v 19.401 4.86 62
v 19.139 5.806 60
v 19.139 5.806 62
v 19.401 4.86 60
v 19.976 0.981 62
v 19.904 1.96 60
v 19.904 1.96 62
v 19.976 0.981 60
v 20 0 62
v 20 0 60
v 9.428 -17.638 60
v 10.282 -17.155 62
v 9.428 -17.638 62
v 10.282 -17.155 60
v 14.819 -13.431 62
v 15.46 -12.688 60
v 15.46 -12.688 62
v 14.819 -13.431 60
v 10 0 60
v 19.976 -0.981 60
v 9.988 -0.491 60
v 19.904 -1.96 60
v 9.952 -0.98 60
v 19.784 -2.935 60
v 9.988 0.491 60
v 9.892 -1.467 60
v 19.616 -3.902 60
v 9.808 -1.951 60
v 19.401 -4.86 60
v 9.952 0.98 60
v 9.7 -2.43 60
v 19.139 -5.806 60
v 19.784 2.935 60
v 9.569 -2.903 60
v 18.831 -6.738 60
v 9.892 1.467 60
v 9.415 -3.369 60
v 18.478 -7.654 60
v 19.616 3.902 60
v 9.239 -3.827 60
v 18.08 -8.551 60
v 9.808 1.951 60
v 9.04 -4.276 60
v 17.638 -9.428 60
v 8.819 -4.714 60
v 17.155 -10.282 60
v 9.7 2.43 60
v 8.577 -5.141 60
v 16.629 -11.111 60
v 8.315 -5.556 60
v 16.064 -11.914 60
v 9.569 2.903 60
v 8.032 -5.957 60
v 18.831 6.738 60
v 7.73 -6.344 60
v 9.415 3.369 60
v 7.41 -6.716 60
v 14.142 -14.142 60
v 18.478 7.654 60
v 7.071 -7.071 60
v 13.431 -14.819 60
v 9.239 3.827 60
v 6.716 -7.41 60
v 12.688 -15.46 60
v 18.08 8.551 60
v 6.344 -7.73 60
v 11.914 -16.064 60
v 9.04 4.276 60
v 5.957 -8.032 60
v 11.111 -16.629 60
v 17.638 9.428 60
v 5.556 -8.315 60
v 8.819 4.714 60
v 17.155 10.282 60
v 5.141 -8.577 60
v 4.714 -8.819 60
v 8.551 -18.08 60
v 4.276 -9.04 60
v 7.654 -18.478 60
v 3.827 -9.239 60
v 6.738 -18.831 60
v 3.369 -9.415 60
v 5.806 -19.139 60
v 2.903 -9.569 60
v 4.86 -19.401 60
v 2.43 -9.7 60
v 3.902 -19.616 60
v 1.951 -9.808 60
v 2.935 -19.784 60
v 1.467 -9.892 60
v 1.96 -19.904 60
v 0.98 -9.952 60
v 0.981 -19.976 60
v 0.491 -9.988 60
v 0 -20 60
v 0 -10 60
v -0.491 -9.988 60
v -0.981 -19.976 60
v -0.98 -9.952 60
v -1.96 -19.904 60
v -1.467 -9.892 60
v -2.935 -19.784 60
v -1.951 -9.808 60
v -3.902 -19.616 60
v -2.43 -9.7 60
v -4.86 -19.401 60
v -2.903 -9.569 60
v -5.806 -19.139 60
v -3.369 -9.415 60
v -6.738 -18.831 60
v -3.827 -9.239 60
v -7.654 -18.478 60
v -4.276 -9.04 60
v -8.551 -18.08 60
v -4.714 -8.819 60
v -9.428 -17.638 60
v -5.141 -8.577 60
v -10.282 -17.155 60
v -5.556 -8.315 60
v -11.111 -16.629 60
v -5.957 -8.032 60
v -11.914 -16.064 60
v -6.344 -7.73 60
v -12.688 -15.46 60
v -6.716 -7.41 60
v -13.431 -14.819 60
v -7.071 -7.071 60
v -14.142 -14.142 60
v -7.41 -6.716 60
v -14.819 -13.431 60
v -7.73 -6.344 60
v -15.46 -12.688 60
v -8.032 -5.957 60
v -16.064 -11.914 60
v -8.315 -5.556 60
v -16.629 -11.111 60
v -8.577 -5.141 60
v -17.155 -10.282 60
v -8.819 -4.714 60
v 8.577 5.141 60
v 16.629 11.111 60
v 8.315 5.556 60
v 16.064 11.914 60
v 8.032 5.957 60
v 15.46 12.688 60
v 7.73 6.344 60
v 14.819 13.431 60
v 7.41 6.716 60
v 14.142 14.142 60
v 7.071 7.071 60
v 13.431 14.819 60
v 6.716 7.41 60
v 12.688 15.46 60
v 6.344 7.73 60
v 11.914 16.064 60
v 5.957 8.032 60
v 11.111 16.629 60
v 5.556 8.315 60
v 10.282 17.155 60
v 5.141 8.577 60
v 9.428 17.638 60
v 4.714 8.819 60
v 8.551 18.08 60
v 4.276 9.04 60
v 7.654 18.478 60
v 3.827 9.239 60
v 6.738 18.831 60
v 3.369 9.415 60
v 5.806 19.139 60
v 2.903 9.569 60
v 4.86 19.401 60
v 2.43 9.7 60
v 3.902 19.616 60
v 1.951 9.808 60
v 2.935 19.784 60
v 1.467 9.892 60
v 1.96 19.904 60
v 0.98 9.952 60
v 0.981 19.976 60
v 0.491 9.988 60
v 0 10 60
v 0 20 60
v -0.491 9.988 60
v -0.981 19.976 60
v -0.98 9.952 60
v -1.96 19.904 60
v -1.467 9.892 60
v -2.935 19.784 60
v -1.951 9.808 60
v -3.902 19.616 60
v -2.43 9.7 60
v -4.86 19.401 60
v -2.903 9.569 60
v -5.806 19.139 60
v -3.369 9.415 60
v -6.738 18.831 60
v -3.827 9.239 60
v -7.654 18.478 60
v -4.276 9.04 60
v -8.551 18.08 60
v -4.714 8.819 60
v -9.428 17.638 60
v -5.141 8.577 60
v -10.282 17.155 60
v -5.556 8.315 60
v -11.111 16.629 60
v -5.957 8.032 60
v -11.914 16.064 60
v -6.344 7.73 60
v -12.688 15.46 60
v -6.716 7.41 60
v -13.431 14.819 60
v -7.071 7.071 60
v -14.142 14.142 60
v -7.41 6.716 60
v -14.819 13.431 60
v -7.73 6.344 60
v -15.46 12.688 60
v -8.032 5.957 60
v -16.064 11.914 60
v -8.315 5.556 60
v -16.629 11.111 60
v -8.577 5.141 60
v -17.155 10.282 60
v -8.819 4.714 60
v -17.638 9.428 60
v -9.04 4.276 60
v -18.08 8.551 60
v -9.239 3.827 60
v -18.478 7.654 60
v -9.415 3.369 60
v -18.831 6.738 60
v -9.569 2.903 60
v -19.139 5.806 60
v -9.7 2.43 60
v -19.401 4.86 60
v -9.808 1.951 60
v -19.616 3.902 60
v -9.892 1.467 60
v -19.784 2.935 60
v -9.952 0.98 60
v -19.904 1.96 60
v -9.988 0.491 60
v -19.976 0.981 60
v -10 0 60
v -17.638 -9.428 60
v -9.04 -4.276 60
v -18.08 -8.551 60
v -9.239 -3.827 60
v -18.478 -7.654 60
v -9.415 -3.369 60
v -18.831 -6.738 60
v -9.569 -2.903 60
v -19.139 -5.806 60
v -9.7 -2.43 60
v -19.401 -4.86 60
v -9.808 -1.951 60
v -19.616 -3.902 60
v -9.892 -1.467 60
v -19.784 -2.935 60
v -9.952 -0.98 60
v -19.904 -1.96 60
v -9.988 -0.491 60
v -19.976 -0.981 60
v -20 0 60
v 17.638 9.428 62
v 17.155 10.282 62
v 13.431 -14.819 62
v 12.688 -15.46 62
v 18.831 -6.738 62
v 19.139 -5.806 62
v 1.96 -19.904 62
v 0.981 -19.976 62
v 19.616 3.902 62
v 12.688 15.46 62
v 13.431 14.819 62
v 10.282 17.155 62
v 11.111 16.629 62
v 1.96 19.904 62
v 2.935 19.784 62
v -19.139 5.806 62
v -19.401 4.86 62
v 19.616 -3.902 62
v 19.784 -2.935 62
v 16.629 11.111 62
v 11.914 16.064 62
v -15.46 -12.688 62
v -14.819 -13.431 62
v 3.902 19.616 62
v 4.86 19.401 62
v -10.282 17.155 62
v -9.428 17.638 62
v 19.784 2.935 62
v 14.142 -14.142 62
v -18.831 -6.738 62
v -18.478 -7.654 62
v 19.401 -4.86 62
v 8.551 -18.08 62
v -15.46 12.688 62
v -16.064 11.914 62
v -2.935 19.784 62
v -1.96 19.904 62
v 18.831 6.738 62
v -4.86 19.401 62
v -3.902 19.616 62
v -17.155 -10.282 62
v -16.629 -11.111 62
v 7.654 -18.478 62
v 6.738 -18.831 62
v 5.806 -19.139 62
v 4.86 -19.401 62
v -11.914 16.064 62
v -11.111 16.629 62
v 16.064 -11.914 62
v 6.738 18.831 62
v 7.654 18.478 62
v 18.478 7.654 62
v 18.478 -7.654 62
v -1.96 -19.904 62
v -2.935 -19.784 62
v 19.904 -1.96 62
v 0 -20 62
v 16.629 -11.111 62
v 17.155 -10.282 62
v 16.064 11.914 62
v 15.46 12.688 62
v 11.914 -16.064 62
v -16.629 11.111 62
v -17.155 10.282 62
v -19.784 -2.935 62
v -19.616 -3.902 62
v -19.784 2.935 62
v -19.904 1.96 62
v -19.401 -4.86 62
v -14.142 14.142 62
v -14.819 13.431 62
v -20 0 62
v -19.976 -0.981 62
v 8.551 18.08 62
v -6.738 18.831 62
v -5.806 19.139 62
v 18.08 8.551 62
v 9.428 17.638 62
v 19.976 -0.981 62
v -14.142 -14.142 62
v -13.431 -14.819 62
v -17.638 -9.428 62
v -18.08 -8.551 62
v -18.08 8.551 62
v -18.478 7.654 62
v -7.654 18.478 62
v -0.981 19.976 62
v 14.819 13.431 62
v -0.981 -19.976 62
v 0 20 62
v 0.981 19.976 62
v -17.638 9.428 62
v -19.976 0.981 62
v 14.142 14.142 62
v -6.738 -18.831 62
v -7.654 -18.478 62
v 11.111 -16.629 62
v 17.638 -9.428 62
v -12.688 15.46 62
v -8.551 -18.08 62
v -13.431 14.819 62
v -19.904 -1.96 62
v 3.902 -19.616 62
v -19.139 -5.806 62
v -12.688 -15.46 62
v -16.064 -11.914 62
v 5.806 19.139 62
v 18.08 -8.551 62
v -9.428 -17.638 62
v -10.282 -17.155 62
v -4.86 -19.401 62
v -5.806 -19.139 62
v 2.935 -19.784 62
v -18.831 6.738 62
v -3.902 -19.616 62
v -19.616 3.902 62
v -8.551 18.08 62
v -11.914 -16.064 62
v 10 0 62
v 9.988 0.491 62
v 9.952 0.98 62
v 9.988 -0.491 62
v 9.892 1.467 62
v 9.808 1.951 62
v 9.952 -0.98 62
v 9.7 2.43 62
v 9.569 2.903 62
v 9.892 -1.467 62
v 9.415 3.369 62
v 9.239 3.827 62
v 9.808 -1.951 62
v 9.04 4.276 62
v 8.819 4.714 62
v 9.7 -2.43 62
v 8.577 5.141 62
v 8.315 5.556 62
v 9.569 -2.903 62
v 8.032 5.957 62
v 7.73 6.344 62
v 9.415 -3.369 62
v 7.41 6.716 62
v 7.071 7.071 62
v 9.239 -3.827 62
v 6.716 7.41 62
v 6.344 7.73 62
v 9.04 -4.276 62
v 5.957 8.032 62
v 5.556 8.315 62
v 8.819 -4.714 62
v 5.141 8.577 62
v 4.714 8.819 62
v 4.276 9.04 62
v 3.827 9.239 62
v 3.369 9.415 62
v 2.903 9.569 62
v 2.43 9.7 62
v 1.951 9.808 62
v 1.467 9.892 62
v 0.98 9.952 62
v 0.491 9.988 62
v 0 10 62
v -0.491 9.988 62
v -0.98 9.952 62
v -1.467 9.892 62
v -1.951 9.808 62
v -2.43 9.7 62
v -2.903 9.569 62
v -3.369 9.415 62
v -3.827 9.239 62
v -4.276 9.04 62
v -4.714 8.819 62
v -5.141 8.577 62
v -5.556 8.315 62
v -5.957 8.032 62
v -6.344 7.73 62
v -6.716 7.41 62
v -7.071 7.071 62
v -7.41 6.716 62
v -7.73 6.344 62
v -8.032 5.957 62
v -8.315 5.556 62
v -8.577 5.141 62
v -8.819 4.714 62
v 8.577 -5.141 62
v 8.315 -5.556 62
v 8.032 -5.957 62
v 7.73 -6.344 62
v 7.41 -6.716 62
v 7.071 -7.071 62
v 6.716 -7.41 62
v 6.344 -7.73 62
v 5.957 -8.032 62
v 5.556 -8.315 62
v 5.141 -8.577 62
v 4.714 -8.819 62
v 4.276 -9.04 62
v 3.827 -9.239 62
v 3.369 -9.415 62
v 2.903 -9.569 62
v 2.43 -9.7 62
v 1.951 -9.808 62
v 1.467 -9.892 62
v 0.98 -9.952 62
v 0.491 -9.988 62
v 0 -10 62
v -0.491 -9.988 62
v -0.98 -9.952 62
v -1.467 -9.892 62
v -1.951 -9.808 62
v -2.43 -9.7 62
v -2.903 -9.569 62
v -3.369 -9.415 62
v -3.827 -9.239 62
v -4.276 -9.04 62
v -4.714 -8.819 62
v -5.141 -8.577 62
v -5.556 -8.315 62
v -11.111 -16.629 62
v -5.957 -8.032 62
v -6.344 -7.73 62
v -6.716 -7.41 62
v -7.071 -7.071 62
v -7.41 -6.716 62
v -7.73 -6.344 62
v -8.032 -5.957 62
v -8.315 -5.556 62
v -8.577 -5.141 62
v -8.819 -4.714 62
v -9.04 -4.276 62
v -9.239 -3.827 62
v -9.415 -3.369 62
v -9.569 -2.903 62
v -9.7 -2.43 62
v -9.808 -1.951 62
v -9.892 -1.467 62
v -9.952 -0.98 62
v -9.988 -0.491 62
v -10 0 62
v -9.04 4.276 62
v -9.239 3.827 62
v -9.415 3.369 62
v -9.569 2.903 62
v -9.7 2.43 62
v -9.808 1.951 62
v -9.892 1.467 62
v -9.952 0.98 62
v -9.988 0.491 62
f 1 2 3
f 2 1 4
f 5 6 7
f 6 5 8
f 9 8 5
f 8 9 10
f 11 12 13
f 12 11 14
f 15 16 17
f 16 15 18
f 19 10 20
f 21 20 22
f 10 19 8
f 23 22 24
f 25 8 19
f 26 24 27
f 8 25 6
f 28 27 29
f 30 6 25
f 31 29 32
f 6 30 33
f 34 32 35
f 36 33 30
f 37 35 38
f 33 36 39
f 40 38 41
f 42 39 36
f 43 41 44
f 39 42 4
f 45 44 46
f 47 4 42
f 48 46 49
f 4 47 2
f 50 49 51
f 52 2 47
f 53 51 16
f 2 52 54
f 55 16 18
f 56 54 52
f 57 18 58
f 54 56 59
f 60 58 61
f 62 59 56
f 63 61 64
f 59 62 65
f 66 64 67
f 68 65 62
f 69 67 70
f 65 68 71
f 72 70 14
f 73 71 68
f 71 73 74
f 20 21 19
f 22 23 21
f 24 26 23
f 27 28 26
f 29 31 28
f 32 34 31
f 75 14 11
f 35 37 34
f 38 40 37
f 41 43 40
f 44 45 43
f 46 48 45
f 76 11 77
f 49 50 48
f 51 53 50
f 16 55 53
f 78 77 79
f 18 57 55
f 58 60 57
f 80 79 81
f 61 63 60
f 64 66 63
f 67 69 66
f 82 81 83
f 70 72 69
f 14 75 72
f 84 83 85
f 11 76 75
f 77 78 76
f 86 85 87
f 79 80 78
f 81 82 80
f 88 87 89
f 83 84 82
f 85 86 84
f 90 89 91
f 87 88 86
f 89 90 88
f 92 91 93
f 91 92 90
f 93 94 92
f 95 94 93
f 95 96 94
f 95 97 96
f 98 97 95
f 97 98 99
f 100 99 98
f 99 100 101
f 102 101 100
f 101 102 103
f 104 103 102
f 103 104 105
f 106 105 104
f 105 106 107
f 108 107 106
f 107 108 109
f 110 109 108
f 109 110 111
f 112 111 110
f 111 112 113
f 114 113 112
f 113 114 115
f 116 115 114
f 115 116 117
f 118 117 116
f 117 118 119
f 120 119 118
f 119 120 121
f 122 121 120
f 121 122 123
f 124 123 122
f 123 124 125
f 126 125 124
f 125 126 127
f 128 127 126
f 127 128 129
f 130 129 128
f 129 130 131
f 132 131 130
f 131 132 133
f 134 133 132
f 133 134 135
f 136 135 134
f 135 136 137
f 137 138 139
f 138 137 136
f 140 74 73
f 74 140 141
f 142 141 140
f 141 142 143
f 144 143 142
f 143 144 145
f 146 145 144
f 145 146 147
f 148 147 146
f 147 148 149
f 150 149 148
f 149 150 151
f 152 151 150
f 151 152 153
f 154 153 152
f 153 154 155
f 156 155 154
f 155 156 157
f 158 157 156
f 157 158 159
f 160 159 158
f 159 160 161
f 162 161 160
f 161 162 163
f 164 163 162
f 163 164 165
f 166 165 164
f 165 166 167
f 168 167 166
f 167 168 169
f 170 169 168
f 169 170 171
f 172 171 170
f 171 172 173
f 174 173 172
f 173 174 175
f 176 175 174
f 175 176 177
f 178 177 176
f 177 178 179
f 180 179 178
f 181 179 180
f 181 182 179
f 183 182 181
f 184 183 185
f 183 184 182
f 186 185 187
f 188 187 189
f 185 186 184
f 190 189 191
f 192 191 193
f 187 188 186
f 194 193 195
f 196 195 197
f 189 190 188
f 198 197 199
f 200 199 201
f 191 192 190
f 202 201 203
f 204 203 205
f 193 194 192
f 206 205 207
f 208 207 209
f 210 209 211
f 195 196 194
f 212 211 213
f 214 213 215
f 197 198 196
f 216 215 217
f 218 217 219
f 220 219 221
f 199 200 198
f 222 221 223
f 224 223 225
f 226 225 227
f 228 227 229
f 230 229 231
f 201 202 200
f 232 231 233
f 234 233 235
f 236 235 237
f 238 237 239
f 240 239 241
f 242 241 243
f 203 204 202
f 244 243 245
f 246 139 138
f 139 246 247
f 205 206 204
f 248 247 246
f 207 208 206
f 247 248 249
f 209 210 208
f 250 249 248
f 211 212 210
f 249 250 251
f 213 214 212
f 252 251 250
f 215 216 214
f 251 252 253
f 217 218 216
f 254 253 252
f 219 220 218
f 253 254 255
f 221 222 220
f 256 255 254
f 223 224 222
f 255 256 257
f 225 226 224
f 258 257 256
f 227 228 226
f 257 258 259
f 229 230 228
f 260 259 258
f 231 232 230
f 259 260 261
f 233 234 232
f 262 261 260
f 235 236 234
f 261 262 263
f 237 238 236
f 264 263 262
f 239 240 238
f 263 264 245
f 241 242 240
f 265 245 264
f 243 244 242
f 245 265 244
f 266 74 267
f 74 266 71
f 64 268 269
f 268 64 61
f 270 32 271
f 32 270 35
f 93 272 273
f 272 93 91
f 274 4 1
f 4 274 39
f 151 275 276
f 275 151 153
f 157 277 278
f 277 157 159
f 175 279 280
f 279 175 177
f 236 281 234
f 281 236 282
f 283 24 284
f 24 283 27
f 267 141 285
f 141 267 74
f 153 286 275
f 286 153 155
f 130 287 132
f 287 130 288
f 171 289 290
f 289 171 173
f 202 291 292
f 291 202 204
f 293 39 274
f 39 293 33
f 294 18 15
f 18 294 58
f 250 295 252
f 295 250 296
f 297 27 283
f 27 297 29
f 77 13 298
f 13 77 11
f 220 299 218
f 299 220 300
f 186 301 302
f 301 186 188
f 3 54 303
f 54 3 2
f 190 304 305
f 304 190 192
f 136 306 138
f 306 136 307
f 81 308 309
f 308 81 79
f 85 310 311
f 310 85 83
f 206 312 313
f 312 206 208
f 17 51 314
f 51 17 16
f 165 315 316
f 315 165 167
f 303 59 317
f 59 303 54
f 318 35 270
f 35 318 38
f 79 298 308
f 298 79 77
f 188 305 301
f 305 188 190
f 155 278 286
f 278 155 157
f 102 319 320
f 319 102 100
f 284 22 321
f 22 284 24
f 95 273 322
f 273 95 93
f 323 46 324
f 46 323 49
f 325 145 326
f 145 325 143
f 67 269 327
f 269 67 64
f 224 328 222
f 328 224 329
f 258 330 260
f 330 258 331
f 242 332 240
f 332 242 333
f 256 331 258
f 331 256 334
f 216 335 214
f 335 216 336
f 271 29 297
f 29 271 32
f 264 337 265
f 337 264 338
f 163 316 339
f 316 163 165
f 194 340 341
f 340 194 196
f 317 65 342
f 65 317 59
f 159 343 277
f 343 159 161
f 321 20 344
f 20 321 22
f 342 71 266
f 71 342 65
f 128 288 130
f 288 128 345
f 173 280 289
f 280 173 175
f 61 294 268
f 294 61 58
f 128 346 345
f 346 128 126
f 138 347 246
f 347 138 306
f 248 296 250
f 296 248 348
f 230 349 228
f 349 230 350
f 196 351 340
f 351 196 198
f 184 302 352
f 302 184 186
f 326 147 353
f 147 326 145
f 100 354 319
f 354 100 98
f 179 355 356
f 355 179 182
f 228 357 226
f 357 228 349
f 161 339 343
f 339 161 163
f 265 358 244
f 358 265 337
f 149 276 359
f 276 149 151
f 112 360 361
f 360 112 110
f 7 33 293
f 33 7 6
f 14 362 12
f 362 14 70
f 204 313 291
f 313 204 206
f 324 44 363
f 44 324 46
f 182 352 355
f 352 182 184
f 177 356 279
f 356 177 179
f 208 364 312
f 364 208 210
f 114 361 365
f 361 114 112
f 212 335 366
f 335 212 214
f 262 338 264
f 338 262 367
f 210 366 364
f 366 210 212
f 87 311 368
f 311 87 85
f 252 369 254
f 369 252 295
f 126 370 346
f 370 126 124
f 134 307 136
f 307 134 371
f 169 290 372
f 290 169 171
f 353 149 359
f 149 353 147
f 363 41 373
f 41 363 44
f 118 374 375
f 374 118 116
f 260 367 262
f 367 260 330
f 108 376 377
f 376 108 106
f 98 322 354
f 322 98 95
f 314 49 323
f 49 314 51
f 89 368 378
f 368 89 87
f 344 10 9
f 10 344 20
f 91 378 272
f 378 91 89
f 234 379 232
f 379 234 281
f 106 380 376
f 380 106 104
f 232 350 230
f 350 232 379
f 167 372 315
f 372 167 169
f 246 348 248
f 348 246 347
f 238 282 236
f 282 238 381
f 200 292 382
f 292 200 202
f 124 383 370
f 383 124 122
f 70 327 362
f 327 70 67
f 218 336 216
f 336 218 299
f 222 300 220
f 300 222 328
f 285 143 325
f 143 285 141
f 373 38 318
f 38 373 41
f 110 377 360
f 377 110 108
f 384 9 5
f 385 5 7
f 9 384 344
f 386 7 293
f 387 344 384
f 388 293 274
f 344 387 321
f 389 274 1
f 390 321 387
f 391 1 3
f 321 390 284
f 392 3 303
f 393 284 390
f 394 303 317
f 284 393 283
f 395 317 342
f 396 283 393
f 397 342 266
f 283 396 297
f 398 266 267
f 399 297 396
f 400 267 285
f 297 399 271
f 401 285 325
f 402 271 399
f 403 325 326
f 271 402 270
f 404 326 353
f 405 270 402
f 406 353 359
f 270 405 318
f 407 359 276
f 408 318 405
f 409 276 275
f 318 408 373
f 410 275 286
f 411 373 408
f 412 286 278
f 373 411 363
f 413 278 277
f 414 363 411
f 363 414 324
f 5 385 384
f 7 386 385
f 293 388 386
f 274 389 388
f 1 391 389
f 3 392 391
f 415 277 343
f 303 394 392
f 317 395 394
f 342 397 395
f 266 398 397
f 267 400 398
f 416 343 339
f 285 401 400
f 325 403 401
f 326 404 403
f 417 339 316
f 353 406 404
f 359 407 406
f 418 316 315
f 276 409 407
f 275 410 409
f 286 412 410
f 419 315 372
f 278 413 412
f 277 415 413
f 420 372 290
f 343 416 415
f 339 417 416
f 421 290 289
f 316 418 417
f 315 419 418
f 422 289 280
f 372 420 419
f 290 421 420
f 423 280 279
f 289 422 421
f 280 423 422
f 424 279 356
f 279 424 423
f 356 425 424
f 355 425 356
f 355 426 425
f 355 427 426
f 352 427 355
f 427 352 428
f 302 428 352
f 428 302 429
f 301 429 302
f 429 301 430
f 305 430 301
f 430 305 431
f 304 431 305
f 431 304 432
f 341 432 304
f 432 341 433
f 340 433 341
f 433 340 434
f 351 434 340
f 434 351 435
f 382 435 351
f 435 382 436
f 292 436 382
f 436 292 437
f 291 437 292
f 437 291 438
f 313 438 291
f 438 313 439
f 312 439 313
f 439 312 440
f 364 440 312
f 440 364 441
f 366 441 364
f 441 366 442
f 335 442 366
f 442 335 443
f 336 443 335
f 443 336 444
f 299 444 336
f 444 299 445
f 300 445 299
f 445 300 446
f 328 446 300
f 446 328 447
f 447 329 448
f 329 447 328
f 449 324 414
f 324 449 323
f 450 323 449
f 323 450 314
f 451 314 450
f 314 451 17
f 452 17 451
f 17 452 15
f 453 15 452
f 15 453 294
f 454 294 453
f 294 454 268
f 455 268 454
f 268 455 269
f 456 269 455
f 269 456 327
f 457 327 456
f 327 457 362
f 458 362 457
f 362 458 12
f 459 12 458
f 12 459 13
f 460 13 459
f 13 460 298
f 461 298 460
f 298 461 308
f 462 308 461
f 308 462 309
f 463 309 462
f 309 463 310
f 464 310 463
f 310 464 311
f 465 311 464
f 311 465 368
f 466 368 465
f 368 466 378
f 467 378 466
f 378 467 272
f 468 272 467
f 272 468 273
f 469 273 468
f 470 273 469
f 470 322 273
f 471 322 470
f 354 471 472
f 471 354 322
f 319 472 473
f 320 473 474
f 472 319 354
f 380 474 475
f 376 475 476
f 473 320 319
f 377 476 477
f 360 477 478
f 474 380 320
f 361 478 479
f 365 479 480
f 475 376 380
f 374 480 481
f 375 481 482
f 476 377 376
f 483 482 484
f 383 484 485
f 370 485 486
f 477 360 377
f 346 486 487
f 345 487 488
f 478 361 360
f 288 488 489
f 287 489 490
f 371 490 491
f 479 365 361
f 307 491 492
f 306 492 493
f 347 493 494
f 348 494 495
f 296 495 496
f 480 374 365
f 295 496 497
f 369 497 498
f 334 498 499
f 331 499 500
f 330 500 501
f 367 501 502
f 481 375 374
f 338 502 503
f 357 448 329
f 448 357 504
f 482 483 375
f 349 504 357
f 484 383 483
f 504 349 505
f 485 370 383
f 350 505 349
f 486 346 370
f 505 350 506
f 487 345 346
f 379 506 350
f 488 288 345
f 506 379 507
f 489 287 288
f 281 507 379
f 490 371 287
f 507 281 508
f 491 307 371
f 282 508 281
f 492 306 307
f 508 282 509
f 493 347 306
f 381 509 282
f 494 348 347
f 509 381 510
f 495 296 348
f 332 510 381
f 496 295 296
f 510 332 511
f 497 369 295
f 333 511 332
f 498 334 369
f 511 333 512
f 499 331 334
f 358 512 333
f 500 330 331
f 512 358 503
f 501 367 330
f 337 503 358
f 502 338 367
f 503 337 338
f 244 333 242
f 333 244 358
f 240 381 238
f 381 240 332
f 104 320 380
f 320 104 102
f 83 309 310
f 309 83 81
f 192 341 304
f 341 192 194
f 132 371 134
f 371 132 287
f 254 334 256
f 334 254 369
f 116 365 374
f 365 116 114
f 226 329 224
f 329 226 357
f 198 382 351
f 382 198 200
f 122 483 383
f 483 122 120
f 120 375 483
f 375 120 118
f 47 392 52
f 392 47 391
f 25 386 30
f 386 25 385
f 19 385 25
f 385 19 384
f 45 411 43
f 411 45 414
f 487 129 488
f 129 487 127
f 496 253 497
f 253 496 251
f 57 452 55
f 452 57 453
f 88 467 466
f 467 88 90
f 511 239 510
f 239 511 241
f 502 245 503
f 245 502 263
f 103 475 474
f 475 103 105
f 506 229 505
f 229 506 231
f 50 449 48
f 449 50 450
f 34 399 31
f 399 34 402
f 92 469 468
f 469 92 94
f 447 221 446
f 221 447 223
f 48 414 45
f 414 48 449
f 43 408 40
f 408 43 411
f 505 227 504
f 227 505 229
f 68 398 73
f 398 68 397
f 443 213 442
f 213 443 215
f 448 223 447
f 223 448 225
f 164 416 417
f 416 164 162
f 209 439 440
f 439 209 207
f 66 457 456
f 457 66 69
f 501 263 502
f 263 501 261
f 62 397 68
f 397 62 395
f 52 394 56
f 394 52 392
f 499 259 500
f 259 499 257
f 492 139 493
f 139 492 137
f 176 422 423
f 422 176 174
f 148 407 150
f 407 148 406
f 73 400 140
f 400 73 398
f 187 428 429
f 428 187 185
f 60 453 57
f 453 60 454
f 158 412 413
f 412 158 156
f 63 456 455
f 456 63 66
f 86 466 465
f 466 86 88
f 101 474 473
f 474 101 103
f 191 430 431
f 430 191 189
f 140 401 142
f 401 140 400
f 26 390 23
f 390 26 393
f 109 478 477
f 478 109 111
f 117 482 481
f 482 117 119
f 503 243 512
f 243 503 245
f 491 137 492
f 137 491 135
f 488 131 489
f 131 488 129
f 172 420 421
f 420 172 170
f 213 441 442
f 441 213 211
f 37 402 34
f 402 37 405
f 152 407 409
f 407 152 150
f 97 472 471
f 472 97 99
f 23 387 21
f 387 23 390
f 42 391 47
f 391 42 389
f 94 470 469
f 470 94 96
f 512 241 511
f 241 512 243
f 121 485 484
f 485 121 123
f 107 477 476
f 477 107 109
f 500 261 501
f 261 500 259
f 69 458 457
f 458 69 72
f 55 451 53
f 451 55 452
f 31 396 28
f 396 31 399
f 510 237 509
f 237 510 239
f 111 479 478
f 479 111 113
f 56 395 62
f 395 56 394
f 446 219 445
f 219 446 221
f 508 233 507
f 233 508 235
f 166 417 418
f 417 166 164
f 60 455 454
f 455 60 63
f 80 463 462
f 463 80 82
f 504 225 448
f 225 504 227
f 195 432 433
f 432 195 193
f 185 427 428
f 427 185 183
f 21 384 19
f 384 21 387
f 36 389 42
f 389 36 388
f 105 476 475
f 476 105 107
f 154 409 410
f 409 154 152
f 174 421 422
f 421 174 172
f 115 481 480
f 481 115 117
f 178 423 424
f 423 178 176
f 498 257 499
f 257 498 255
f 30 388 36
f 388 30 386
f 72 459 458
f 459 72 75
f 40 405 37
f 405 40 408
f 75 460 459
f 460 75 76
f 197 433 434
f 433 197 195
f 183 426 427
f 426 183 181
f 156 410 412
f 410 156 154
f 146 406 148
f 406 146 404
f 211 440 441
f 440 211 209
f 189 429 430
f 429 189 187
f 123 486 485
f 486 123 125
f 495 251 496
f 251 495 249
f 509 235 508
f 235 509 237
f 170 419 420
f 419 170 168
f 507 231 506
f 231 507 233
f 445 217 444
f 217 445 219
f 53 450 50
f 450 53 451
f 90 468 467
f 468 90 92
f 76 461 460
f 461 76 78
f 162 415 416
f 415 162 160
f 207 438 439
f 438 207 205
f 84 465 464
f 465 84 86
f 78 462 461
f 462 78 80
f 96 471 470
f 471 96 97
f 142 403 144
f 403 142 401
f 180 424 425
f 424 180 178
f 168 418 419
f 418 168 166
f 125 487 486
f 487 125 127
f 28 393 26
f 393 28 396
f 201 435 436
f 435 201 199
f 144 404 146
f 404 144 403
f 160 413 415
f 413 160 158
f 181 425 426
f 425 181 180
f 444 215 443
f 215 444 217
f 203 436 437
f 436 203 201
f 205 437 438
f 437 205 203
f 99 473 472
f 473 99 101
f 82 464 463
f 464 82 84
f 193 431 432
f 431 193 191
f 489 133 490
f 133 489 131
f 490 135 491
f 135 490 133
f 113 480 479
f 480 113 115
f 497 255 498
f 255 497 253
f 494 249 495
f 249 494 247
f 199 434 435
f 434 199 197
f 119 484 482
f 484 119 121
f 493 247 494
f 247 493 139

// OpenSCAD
// file: common_params.scad
cylinder_radius = 20.000000;
cylinder_height = 60.000000;
wall_thickness = 2.000000;

cap_thickness = 2.000000;

rod_radius = 2.000000;
rod_height = 50.000000;

ring_outer_radius = 8.000000;
ring_inner_radius = 4.000000;
ring_thickness = 3.000000;
ring_z = 40.000000;

$fn = 128;
// main file
include <common_params.scad>;

hole_radius = 10.000000;

translate([0, 0, cylinder_height])
difference() {
    cylinder(h = cap_thickness, r = cylinder_radius);
    translate([0, 0, -0.1])
        cylinder(h = cap_thickness + 0.2, r = hole_radius);
}
